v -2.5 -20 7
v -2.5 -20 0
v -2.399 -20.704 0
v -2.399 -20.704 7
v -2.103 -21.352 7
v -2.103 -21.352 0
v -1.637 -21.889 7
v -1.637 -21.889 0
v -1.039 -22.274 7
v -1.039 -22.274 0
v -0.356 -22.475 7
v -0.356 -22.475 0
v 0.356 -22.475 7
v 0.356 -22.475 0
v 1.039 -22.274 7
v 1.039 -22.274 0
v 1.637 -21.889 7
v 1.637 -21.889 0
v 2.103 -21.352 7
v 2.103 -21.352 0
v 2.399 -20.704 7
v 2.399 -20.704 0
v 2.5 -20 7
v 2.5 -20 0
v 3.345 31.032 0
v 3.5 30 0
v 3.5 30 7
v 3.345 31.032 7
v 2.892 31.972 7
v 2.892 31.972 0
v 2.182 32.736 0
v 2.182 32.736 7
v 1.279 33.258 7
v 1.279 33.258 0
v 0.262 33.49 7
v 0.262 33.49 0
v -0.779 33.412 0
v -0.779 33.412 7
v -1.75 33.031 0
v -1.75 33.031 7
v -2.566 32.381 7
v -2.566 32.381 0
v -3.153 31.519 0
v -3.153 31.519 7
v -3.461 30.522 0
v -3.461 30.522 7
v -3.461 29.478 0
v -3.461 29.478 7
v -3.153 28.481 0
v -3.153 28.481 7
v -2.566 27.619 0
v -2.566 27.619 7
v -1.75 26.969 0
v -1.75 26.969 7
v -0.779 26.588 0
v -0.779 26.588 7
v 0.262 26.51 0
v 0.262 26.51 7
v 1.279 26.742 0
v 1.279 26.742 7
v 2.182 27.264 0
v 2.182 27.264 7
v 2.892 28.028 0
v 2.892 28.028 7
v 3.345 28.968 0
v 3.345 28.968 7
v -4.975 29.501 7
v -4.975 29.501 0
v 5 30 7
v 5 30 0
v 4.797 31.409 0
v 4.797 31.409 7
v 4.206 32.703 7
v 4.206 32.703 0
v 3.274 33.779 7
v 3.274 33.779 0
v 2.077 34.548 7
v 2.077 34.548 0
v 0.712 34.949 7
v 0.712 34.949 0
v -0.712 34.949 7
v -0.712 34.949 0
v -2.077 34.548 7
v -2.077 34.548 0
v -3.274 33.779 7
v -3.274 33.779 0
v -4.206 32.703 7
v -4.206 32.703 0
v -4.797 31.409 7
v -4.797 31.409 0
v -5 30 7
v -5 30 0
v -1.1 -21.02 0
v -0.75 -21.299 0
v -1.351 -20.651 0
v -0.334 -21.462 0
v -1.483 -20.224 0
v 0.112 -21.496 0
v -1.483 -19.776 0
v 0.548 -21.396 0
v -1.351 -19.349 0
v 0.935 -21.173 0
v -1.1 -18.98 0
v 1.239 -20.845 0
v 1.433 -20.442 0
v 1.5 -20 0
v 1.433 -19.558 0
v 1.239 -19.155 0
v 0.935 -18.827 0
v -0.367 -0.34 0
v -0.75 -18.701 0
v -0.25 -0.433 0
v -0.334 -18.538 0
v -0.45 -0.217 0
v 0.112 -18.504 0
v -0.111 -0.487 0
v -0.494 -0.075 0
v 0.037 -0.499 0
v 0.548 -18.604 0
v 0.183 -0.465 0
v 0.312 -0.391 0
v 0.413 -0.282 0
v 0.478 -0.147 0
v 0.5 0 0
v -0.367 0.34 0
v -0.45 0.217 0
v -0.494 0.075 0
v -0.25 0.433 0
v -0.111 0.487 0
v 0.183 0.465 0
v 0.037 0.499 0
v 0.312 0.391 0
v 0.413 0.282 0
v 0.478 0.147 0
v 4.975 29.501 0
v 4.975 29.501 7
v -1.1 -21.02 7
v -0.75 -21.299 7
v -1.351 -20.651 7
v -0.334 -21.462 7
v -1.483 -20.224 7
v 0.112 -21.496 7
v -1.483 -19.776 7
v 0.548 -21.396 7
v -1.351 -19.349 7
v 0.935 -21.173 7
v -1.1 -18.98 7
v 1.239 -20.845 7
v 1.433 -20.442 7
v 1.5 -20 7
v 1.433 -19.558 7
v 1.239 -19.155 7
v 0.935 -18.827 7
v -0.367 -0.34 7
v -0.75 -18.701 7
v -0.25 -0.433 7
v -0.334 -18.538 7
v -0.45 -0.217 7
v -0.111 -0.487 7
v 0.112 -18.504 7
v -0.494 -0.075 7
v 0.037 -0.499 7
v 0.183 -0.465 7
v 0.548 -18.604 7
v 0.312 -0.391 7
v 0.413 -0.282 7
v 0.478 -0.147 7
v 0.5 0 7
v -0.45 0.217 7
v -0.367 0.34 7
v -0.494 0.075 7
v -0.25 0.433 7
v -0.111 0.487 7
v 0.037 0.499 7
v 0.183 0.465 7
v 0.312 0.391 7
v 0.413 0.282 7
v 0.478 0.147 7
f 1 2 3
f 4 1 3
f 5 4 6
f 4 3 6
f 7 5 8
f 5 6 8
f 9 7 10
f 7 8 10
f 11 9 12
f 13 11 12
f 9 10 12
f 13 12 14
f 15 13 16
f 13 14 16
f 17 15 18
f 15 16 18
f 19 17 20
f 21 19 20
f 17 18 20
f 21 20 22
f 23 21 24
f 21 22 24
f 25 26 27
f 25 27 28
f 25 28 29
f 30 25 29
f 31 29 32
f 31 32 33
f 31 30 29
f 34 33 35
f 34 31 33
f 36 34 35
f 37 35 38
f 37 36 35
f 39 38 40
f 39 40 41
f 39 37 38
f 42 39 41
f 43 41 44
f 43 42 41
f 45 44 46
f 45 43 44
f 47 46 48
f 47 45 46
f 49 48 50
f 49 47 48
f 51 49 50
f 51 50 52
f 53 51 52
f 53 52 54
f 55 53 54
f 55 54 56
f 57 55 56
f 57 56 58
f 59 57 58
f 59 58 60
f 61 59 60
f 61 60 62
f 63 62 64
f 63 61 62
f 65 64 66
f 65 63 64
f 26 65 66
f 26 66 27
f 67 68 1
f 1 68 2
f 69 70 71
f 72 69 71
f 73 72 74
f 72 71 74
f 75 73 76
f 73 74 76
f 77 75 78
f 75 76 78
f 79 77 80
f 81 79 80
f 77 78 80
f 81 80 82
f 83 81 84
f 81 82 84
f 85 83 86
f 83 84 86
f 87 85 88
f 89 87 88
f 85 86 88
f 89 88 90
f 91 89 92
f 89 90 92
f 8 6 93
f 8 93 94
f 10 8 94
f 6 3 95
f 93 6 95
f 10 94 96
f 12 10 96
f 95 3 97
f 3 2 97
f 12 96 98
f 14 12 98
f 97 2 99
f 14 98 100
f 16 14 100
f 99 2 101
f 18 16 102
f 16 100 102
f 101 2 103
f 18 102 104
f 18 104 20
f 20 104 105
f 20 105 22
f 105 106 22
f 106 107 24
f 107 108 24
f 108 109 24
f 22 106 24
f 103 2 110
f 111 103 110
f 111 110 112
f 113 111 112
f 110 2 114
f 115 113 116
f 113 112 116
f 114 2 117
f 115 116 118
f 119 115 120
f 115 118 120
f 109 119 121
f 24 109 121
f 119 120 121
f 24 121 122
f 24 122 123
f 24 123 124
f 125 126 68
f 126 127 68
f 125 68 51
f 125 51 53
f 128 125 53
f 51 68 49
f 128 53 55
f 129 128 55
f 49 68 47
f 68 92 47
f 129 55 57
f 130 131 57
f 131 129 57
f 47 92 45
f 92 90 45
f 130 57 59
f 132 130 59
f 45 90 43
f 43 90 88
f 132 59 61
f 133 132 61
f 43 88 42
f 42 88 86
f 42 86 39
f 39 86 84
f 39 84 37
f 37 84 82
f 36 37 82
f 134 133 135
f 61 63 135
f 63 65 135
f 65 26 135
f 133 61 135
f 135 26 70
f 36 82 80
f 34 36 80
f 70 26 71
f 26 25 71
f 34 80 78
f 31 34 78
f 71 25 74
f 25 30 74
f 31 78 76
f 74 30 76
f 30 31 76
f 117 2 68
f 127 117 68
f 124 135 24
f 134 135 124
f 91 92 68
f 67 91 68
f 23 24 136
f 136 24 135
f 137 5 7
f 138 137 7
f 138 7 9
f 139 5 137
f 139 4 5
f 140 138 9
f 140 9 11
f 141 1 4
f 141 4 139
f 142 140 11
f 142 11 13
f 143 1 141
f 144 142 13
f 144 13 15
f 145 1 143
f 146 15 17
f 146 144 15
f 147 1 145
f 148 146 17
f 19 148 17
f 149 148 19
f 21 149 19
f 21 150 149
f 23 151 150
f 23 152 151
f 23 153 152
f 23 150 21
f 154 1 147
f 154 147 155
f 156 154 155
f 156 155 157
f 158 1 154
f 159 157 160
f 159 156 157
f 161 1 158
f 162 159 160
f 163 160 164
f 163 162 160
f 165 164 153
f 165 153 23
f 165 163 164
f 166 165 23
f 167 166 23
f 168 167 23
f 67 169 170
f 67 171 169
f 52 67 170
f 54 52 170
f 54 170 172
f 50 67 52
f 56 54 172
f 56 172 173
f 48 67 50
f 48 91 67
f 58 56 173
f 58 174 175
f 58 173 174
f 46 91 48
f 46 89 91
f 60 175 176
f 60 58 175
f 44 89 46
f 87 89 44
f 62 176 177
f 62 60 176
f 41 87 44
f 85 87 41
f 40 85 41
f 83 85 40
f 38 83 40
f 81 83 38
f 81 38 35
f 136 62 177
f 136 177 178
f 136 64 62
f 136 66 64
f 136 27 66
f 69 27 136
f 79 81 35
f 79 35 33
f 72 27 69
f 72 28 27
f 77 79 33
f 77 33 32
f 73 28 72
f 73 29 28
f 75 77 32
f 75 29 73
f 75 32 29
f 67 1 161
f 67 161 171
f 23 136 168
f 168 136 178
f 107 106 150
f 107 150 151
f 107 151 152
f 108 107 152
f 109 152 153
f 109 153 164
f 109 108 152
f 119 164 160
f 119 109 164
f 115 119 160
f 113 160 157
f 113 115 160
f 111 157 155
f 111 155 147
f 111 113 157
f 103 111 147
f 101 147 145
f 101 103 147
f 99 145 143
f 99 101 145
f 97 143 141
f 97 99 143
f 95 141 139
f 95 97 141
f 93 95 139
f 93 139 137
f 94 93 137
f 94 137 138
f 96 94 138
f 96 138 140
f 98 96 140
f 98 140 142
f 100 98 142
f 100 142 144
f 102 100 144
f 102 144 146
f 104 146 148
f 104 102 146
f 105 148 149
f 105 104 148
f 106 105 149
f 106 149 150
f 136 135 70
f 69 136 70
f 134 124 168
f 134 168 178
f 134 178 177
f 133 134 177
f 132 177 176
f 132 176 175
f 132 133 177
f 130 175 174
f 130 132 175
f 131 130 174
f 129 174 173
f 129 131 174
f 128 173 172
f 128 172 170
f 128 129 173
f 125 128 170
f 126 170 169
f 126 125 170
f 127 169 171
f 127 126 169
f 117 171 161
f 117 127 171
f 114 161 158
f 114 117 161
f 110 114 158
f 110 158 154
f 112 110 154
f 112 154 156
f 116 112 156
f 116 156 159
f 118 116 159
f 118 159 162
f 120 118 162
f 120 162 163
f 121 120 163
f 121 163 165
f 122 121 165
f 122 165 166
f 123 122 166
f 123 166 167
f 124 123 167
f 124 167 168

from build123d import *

# Parameters (mm, degrees)
SKETCH1_R           = 1.5
SKETCH1_R_2         = 0.5
SKETCH1_R_3         = 3.5
BOSS_EXTRUDE1_DEPTH = 7
SKETCH1_4_R         = 0.5
BOSS_EXTRUDE2_DEPTH = 5
SKETCH1_5_R         = 0.5
CUT_EXTRUDE3_DEPTH  = 17


with BuildPart() as part:
    # Sketch1 → Boss-Extrude1 (new body)
    with BuildSketch(Plane.XY):
        with BuildLine():
            Line((4.975062344, 29.501246883), (5, 30))
            ThreePointArc((5, 30), (0, 35), (-5, 30))
            Line((-5, 30), (-4.975062344, 29.501246883))
            Line((-4.975062344, 29.501246883), (-2.5, -20))
            ThreePointArc((-2.5, -20), (0, -22.5), (2.5, -20))
            Line((2.5, -20), (4.975062344, 29.501246883))
        make_face()
        with Locations((0, -20)):
            Circle(SKETCH1_R, mode=Mode.SUBTRACT)
        Circle(SKETCH1_R_2, mode=Mode.SUBTRACT)
        with Locations((0, 30)):
            Circle(SKETCH1_R_3, mode=Mode.SUBTRACT)
    extrude(amount=BOSS_EXTRUDE1_DEPTH)

    # Sketch1<4> → Boss-Extrude2 (add)
    with BuildSketch(Plane.XY):
        Circle(SKETCH1_4_R)
    extrude(amount=BOSS_EXTRUDE2_DEPTH)

    # Sketch1<5> → Cut-Extrude3 (cut)
    with BuildSketch(Plane.XY):
        Circle(SKETCH1_5_R)
    extrude(amount=CUT_EXTRUDE3_DEPTH, mode=Mode.SUBTRACT)


solid = part.part
